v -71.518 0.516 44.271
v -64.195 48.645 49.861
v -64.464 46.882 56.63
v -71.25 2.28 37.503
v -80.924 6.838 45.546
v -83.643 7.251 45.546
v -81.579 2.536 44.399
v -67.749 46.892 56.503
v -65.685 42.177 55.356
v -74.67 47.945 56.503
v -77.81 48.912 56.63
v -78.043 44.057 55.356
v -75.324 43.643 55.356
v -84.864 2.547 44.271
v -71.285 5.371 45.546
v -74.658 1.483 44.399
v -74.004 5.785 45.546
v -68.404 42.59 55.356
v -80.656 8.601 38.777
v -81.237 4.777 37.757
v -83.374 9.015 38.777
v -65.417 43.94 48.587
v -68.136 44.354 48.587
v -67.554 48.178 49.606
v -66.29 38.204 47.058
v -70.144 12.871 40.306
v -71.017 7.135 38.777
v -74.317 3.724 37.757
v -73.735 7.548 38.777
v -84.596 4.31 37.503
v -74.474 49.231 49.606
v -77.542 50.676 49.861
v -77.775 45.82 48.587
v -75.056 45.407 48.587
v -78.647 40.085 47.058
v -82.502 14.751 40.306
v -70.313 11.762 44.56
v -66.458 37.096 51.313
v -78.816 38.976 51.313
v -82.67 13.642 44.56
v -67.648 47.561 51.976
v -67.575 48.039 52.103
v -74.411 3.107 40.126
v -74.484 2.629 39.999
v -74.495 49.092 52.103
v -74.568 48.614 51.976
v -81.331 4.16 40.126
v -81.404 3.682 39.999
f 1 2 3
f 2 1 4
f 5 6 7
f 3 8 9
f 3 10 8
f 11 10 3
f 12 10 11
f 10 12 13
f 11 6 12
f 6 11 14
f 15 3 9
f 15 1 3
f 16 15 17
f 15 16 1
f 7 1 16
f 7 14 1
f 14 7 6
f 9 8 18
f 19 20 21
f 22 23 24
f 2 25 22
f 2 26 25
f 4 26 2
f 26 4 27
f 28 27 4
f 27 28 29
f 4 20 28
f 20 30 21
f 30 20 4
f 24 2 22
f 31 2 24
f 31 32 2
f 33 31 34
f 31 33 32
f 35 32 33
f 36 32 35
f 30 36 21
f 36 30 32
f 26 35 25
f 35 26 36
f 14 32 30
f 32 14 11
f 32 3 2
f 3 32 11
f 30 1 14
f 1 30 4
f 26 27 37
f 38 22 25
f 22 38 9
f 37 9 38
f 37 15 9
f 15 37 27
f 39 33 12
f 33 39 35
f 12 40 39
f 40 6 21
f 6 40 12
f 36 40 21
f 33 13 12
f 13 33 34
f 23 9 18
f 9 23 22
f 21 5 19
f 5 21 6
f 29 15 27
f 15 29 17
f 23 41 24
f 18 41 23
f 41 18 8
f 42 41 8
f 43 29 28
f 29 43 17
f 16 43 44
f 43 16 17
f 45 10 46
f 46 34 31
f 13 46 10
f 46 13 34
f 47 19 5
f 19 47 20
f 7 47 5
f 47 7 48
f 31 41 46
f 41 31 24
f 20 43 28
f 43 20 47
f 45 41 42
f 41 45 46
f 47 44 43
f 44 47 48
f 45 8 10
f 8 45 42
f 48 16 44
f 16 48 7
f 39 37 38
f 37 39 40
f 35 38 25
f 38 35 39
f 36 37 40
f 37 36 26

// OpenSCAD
// Generated by SolidPython 1.1.3 on 2025-12-02 19:42:02


translate(v = [-74.52985690209567, 25.595877133079668, 47.06634805542881]) {
	rotate(a = [14.7627925 , 0.        ,-8.65071739]) {
		union() {
			difference() {
				cube(center = true, size = [13.5000000000, 48.5000000000, 7.0000000000]);
				cube(center = true, size = [12.5000000000, 38.5000000000, 7.1000000000]);
				cube(center = true, size = [7.0000000000, 46.5000000000, 7.1000000000]);
				translate(v = [0.0000000000, 0.0000000000, 2.5000000000]) {
					cube(center = true, size = [7.0000000000, 47.5000000000, 7.1000000000]);
				}
			}
			translate(v = [0.0000000000, 0.0000000000, -1.3000000000]) {
				cube(center = true, size = [12.6000000000, 26.5000000000, 4.4000000000]);
			}
		}
	}
}
/***********************************************
*********      SolidPython code:      **********
************************************************
 
import solid as sl

debug_trace = False

def debugprint(info):
    if debug_trace:
        print(info)

def box(width, height, depth):
    return sl.cube([width, height, depth], center=True)


def cylinder(radius, height, segments=100):
    return sl.cylinder(r=radius, h=height, segments=segments, center=True)


def sphere(radius):
    return sl.sphere(radius)


def cone(r1, r2, height):
    return sl.cylinder(r1=r1, r2=r2, h=height)  # , center=True)


def rotate(shape, angle):
    if shape is None:
        return None
    return sl.rotate(angle)(shape)


def translate(shape, vector):
    if shape is None:
        return None
    return sl.translate(tuple(vector))(shape)


def mirror(shape, plane=None):
    debugprint('mirror()')
    planes = {
        'XY': [0, 0, 1],
        'YX': [0, 0, -1],
        'XZ': [0, 1, 0],
        'ZX': [0, -1, 0],
        'YZ': [1, 0, 0],
        'ZY': [-1, 0, 0],
    }
    return sl.mirror(planes[plane])(shape)


def union(shapes):
    debugprint('union()')
    shape = None
    for item in shapes:
        if item is not None:
            if shape is None:
                shape = item
            else:
                shape += item
    return shape


def add(shapes):
    debugprint('union()')
    shape = None
    for item in shapes:
        if item is not None:
            if shape is None:
                shape = item
            else:
                shape += item
    return shape


def difference(shape, shapes):
    debugprint('difference()')
    for item in shapes:
        if item is not None:
            shape -= item
    return shape


def intersect(shape1, shape2):
    if shape2 is not None:
        return sl.intersection()(shape1, shape2)
    else:
        return shape1

def hull_from_points(points):
    return sl.hull()(*points)


def hull_from_shapes(shapes, points=None):
    hs = []
    if points is not None:
        hs.extend(points)
    if shapes is not None:
        hs.extend(shapes)
    return sl.hull()(*hs)


def tess_hull(shapes, sl_tol=.5, sl_angTol=1):
    return sl.hull()(*shapes)


def triangle_hulls(shapes):
    debugprint('triangle_hulls()')
    hulls = []
    for i in range(len(shapes) - 2):
        hulls.append(hull_from_shapes(shapes[i: (i + 3)]))

    return union(hulls)



def bottom_hull(p, height=0.001):
    debugprint("bottom_hull()")
    shape = None
    for item in p:
        proj = sl.projection()(p)
        t_shape = sl.linear_extrude(height=height, twist=0, convexity=0, center=True)(
            proj
        )
        t_shape = sl.translate([0, 0, height / 2 - 10])(t_shape)
        if shape is None:
            shape = t_shape
        shape = sl.hull()(p, shape, t_shape)
    return shape

def polyline(point_list):
    return sl.polygon(point_list)


# def project_to_plate():
#     square = cq.Workplane('XY').rect(1000, 1000)
#     for wire in square.wires().objects:
#         plane = cq.Workplane('XY').add(cq.Face.makeFromWires(wire))

def extrude_poly(outer_poly, inner_polys=None, height=1):
    if inner_polys is not None:
        return sl.linear_extrude(height=height, twist=0, convexity=0, center=True)(outer_poly, *inner_polys)
    else:
        return sl.linear_extrude(height=height, twist=0, convexity=0, center=True)(outer_poly)


def import_file(fname, convexity=2):
    print("IMPORTING FROM {}".format(fname))
    return sl.import_stl(fname.replace("\\", "/") + ".stl", convexity=convexity)


def export_file(shape, fname):
    print("EXPORTING TO {}".format(fname))
    sl.scad_render_to_file(shape, fname + ".scad")


def export_dxf(shape, fname):
    print("NO DXF EXPORT FOR SOLID".format(fname))
    pass 
 
************************************************/
